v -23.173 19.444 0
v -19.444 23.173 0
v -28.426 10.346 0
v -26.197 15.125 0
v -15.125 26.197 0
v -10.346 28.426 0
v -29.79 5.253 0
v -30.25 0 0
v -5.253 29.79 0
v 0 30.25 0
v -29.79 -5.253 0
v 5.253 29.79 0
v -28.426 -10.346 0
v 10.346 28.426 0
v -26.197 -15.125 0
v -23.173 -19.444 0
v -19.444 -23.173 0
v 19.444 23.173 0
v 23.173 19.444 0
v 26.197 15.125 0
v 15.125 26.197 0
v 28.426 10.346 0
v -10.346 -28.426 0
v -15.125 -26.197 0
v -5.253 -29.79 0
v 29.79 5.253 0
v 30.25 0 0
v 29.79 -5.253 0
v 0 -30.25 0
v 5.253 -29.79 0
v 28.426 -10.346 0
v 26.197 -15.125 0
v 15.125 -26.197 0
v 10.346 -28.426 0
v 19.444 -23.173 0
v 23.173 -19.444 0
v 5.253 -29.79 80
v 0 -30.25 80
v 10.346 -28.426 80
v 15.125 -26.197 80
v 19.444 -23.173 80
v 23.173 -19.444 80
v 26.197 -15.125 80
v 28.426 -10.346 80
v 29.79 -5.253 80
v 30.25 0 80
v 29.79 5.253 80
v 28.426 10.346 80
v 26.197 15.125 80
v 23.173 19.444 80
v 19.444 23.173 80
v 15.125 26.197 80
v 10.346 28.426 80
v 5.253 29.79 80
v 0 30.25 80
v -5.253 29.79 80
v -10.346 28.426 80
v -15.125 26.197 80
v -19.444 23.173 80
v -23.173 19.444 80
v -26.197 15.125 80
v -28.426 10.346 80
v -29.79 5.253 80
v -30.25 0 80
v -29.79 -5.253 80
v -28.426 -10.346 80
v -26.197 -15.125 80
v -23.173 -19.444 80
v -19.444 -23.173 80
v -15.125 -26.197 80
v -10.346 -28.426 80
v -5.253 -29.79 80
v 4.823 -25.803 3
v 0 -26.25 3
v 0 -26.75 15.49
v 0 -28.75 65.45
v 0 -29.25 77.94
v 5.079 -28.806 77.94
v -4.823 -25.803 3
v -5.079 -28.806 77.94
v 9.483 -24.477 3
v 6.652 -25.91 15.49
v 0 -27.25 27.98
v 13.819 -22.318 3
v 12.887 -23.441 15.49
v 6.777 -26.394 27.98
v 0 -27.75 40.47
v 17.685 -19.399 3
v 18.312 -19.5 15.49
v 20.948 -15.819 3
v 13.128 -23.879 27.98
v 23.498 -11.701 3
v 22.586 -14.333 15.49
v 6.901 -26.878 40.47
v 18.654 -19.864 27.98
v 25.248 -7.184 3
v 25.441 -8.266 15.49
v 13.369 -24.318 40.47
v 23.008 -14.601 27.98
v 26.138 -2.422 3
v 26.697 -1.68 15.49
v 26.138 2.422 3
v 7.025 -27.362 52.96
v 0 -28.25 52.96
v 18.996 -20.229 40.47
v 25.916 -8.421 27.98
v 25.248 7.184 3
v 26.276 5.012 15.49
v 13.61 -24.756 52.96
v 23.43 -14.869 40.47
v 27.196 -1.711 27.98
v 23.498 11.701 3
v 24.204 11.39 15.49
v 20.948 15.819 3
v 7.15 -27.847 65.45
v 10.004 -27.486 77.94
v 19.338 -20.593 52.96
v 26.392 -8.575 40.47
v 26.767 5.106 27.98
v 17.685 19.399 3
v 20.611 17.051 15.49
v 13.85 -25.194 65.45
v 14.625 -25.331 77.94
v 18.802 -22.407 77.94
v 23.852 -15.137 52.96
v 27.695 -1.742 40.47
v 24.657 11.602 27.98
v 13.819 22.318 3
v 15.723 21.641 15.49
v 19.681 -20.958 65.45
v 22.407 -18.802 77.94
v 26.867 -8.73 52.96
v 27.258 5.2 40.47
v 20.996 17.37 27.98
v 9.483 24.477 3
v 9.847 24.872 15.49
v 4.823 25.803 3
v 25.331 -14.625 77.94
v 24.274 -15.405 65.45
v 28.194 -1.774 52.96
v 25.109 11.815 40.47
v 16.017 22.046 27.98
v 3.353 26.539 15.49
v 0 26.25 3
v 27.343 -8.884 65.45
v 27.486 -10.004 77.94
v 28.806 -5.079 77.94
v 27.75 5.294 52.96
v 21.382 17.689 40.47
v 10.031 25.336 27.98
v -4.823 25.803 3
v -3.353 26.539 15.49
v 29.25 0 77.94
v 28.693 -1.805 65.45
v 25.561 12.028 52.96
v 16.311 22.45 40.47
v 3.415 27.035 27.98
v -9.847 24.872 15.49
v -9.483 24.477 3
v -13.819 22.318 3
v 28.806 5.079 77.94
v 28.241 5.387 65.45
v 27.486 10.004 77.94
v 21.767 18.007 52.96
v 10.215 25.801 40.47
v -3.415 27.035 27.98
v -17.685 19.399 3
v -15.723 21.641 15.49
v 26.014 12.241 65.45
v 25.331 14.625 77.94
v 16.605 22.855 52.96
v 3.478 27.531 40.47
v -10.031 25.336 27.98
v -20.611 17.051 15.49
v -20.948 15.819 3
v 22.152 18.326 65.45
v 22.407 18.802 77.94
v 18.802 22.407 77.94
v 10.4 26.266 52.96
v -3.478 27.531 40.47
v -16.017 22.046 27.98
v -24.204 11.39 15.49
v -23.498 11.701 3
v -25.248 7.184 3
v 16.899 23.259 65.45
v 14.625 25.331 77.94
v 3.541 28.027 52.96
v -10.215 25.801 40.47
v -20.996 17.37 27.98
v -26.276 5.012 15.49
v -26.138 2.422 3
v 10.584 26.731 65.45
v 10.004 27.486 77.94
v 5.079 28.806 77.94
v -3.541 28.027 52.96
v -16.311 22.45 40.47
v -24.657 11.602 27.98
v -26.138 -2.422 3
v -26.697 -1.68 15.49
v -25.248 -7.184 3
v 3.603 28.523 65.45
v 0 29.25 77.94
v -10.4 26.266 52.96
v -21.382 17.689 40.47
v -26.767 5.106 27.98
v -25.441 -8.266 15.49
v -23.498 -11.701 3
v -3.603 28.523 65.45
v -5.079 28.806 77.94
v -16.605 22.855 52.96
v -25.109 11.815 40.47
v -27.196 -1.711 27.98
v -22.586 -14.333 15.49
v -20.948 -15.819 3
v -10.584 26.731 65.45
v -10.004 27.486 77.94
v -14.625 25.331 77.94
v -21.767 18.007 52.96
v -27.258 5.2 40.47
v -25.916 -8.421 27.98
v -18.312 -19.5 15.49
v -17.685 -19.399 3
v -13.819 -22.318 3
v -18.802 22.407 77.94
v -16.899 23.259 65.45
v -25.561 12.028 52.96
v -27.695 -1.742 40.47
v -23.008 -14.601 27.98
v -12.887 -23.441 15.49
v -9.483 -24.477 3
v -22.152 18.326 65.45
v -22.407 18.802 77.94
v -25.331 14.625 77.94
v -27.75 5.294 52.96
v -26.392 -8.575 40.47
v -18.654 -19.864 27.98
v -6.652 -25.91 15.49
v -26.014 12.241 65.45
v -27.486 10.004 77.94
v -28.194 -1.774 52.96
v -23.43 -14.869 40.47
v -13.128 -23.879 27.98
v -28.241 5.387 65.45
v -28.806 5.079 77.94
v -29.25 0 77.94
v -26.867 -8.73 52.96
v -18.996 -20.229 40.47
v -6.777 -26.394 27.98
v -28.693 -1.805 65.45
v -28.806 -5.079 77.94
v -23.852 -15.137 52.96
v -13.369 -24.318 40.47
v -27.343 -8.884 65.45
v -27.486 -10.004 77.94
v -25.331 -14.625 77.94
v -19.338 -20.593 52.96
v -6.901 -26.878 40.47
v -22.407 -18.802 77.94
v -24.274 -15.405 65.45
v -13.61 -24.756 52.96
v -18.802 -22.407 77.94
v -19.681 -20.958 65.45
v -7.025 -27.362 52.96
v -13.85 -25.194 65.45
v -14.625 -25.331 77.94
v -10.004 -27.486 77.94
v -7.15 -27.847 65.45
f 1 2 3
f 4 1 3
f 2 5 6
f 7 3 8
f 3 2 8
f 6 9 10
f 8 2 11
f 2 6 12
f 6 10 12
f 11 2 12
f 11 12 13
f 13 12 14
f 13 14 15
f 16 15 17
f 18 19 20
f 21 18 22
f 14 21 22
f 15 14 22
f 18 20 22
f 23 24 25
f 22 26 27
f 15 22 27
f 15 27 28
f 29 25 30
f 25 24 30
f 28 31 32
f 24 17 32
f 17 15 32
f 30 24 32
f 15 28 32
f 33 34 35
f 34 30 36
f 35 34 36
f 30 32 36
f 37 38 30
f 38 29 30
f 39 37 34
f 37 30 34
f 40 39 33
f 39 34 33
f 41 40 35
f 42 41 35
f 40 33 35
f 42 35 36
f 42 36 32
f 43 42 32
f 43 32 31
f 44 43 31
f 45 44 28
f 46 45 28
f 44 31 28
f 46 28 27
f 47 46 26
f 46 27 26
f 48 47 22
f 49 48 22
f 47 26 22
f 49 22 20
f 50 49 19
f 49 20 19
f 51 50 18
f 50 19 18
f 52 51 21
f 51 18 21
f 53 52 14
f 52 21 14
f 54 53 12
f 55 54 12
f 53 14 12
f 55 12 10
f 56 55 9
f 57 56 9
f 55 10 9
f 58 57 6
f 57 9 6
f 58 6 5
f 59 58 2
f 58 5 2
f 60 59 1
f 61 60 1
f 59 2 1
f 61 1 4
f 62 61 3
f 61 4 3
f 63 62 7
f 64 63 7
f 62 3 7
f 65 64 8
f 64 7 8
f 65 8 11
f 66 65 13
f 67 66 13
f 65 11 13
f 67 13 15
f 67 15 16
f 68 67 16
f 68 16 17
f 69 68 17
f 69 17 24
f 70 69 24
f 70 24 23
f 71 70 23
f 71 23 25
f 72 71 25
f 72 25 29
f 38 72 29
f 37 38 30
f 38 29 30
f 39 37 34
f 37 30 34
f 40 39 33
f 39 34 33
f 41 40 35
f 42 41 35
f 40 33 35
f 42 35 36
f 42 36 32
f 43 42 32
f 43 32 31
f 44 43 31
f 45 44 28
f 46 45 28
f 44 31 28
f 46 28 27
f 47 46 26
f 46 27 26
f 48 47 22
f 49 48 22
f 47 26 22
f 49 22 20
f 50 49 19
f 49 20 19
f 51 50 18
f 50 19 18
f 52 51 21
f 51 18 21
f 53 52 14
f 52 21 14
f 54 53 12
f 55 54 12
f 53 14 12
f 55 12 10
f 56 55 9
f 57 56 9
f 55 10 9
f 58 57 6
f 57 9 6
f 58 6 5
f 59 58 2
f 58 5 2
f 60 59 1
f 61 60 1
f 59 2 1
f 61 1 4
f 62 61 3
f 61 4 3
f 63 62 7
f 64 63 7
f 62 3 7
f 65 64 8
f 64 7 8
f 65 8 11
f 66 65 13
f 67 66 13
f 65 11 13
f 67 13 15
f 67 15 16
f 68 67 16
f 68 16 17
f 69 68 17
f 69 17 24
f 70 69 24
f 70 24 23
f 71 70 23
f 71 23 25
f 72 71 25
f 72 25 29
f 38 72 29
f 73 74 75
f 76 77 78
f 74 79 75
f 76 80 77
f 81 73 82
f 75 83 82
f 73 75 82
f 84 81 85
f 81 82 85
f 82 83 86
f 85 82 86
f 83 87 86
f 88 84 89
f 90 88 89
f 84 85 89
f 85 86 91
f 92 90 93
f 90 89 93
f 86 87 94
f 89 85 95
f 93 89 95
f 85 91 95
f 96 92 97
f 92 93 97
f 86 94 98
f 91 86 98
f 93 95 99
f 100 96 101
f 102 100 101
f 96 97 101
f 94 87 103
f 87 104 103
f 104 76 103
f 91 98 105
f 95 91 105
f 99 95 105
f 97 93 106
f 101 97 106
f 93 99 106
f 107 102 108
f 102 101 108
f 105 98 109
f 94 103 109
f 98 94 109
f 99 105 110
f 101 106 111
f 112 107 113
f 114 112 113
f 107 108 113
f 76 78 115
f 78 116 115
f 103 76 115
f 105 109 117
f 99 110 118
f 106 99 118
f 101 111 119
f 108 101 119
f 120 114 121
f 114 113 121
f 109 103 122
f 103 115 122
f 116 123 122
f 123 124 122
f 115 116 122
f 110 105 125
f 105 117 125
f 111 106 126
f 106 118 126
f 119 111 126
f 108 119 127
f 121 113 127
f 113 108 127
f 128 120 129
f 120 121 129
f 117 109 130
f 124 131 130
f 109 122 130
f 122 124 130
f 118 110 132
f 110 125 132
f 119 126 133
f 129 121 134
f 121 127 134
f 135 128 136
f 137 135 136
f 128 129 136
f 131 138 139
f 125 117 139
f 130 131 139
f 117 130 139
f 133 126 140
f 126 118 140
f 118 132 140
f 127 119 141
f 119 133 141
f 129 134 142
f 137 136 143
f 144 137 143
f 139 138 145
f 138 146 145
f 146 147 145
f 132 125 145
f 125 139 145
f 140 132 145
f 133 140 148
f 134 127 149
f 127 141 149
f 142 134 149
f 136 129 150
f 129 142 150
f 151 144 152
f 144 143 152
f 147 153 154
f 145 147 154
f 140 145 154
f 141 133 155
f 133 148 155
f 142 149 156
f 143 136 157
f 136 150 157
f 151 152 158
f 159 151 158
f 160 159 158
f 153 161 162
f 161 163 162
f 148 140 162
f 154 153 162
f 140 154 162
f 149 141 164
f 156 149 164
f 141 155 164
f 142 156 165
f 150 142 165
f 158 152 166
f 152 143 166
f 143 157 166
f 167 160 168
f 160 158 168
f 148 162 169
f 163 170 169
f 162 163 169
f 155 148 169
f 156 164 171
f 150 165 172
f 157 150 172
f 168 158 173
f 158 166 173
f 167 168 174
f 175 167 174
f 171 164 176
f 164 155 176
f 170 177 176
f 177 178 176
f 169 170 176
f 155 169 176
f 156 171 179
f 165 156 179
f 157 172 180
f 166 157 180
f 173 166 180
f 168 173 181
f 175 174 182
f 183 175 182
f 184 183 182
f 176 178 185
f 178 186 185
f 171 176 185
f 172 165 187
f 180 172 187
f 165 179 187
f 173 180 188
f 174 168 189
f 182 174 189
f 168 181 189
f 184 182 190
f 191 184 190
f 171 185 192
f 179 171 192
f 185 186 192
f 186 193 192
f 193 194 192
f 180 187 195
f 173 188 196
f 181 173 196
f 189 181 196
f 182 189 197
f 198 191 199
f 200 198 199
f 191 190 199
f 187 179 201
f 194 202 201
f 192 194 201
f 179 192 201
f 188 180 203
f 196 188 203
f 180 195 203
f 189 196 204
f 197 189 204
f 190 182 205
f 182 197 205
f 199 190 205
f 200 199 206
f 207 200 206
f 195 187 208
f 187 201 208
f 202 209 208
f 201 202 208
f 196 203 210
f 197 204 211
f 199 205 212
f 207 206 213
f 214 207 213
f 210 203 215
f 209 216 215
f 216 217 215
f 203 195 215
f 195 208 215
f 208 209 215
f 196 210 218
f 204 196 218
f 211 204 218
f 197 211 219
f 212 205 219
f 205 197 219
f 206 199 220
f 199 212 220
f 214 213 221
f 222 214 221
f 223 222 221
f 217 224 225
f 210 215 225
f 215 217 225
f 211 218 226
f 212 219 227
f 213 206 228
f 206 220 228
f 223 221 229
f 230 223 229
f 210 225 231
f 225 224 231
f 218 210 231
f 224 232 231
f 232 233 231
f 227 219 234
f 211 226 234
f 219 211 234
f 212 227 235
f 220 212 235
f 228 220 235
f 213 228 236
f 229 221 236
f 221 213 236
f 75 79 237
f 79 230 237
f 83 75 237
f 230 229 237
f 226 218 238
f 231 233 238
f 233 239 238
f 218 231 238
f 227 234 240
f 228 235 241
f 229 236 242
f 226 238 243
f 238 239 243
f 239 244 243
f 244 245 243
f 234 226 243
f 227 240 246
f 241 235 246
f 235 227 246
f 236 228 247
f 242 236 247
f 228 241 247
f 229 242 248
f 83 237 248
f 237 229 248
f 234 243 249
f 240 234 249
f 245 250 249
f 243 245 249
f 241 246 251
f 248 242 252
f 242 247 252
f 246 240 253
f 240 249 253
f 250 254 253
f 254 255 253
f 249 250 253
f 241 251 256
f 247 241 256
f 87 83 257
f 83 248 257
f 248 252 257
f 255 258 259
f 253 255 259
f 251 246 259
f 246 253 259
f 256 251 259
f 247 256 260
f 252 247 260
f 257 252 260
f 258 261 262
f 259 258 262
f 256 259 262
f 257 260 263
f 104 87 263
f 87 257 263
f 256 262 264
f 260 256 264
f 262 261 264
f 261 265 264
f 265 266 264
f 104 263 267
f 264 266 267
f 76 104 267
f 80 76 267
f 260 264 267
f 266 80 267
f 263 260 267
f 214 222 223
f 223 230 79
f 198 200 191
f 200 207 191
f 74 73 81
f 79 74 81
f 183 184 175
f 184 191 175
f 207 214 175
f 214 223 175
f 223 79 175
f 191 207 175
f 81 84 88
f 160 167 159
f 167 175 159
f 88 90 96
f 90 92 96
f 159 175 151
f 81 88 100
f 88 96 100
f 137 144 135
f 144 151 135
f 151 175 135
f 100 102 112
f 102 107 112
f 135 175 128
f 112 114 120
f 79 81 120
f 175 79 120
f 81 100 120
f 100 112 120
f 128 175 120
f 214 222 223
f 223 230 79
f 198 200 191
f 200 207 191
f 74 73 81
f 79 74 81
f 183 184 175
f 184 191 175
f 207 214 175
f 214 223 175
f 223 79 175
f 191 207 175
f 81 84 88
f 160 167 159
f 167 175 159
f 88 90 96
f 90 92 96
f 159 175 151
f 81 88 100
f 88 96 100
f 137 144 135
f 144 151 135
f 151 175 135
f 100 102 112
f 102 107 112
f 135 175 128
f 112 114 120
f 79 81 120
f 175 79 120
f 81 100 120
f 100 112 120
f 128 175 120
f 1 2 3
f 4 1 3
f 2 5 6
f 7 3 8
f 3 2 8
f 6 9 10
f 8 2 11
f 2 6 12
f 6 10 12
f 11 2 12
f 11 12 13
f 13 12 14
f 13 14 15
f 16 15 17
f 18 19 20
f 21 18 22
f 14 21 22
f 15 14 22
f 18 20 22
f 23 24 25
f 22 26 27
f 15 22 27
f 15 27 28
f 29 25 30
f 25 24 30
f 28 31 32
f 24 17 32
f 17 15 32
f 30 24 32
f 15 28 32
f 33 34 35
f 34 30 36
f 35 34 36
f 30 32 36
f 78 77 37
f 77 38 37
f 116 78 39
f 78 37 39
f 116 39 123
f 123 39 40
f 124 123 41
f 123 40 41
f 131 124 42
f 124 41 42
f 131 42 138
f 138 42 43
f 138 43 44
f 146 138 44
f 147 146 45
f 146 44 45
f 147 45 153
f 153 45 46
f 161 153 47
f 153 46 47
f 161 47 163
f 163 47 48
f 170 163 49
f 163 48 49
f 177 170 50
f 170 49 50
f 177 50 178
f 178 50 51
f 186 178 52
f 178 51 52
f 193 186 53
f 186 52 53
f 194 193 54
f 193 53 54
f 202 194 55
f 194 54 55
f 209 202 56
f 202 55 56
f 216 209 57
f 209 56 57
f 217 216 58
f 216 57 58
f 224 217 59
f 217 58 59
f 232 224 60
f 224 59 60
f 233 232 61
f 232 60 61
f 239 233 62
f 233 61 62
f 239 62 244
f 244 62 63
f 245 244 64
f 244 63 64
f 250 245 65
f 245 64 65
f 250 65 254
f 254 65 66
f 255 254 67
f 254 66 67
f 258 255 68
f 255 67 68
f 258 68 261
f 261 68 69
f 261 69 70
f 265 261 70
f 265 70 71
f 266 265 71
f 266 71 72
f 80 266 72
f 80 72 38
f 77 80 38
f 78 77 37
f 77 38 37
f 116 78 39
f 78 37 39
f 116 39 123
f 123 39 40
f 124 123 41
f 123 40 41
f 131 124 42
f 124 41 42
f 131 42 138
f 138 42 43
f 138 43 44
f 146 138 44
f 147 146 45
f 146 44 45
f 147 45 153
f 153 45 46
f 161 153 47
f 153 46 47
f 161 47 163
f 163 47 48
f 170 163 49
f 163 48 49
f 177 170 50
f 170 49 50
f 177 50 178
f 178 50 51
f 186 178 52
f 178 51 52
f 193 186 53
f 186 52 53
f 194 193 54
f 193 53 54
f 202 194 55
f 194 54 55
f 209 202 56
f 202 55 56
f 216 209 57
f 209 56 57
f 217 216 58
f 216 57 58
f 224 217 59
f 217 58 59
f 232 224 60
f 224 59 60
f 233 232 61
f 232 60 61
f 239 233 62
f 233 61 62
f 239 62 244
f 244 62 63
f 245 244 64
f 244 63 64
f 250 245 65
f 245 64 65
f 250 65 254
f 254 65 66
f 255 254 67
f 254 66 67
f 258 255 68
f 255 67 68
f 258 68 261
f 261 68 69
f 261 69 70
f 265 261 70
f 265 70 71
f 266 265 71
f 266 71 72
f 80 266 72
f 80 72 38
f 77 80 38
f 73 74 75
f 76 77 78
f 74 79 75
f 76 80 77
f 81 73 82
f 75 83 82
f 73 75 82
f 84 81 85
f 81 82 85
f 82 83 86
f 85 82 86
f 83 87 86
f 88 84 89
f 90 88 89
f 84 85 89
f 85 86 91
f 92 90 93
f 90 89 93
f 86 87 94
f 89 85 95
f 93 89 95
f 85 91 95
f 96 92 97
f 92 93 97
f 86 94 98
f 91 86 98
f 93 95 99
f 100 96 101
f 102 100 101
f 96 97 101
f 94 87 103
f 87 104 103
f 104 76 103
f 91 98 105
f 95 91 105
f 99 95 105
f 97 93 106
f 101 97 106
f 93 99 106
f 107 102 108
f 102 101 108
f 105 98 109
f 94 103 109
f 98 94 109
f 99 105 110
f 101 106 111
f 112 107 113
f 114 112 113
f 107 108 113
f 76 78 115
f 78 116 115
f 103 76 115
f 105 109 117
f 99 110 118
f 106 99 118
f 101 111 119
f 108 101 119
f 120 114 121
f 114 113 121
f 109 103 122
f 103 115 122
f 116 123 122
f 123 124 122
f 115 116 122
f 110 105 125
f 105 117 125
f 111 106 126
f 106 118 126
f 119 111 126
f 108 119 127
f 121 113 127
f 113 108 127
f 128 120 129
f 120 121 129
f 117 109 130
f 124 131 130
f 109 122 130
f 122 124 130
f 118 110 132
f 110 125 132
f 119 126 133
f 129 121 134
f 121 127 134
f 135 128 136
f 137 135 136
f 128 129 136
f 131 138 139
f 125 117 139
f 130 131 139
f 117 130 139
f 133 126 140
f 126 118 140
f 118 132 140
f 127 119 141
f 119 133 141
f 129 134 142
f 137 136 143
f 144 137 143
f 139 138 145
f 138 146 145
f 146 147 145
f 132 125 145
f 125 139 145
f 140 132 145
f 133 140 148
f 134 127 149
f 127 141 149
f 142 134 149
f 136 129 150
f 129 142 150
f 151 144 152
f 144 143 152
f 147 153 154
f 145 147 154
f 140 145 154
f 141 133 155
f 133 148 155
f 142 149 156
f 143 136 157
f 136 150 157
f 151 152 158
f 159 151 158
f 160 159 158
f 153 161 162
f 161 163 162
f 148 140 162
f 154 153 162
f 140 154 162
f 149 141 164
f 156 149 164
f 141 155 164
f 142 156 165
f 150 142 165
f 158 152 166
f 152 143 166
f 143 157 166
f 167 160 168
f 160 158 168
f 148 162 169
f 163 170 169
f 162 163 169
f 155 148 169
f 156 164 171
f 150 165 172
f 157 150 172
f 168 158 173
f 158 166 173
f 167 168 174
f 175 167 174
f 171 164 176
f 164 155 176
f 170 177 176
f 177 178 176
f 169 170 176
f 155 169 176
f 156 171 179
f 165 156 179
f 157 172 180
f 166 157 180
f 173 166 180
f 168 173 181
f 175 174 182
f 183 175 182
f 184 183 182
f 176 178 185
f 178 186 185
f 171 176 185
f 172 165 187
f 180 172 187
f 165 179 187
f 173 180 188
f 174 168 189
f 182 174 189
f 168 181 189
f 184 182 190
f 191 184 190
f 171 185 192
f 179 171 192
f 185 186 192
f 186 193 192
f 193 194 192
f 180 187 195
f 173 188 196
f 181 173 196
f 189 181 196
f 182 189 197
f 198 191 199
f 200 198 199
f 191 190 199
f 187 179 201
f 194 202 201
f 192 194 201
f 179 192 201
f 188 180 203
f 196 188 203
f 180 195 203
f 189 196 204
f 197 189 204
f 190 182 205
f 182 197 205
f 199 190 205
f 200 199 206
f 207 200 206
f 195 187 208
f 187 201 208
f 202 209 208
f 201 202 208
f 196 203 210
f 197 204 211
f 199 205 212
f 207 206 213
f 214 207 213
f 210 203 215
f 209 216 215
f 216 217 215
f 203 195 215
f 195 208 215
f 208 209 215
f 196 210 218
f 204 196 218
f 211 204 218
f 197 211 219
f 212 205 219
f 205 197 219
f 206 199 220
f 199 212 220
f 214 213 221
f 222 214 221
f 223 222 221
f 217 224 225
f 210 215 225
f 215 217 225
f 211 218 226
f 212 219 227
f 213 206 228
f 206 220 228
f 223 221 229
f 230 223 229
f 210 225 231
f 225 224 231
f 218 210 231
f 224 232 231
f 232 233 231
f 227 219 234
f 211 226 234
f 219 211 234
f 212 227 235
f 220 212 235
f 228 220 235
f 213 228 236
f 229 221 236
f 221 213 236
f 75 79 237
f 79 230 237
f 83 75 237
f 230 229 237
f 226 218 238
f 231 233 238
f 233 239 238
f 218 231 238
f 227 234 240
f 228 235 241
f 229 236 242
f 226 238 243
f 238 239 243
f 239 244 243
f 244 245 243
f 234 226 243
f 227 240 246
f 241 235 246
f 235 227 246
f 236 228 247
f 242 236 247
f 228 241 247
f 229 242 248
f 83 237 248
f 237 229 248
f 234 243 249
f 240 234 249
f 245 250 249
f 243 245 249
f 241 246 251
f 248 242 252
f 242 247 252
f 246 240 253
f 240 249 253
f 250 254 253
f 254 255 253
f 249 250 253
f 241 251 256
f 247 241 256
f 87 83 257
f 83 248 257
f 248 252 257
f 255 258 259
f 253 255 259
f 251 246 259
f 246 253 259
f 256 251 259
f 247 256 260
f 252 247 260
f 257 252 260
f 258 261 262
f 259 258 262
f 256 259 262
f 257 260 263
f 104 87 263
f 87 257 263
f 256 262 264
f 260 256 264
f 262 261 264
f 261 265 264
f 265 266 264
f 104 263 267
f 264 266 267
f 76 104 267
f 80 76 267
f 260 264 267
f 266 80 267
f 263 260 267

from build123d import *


with BuildPart() as f1:
    # F0 (on Right) → F1 (revolve)
    with BuildSketch(Plane.YZ):
        Polygon((-29.25, 77.939976), (-30.25, 80), (-30.25, 0), (0, 0), (0, 3), (-26.25, 3), align=None)
    revolve(axis=Axis((0, 0, 1.5), (0, 0, 1)))


with BuildPart() as f2_1:
    # F2: copy of F1
    add(f1.part.moved(Location((0, -62, 0))))


with BuildPart() as f4:
    # F0 (on Right) → F4 (revolve)
    with BuildSketch(Plane.YZ):
        Polygon((-29.25, 77.939976), (-30.25, 80), (-30.25, 0), (0, 0), (0, 3), (-26.25, 3), align=None)
    revolve(axis=Axis((0, 0, 1.5), (0, 0, 1)))


solid = Compound([f1.part, f4.part])
